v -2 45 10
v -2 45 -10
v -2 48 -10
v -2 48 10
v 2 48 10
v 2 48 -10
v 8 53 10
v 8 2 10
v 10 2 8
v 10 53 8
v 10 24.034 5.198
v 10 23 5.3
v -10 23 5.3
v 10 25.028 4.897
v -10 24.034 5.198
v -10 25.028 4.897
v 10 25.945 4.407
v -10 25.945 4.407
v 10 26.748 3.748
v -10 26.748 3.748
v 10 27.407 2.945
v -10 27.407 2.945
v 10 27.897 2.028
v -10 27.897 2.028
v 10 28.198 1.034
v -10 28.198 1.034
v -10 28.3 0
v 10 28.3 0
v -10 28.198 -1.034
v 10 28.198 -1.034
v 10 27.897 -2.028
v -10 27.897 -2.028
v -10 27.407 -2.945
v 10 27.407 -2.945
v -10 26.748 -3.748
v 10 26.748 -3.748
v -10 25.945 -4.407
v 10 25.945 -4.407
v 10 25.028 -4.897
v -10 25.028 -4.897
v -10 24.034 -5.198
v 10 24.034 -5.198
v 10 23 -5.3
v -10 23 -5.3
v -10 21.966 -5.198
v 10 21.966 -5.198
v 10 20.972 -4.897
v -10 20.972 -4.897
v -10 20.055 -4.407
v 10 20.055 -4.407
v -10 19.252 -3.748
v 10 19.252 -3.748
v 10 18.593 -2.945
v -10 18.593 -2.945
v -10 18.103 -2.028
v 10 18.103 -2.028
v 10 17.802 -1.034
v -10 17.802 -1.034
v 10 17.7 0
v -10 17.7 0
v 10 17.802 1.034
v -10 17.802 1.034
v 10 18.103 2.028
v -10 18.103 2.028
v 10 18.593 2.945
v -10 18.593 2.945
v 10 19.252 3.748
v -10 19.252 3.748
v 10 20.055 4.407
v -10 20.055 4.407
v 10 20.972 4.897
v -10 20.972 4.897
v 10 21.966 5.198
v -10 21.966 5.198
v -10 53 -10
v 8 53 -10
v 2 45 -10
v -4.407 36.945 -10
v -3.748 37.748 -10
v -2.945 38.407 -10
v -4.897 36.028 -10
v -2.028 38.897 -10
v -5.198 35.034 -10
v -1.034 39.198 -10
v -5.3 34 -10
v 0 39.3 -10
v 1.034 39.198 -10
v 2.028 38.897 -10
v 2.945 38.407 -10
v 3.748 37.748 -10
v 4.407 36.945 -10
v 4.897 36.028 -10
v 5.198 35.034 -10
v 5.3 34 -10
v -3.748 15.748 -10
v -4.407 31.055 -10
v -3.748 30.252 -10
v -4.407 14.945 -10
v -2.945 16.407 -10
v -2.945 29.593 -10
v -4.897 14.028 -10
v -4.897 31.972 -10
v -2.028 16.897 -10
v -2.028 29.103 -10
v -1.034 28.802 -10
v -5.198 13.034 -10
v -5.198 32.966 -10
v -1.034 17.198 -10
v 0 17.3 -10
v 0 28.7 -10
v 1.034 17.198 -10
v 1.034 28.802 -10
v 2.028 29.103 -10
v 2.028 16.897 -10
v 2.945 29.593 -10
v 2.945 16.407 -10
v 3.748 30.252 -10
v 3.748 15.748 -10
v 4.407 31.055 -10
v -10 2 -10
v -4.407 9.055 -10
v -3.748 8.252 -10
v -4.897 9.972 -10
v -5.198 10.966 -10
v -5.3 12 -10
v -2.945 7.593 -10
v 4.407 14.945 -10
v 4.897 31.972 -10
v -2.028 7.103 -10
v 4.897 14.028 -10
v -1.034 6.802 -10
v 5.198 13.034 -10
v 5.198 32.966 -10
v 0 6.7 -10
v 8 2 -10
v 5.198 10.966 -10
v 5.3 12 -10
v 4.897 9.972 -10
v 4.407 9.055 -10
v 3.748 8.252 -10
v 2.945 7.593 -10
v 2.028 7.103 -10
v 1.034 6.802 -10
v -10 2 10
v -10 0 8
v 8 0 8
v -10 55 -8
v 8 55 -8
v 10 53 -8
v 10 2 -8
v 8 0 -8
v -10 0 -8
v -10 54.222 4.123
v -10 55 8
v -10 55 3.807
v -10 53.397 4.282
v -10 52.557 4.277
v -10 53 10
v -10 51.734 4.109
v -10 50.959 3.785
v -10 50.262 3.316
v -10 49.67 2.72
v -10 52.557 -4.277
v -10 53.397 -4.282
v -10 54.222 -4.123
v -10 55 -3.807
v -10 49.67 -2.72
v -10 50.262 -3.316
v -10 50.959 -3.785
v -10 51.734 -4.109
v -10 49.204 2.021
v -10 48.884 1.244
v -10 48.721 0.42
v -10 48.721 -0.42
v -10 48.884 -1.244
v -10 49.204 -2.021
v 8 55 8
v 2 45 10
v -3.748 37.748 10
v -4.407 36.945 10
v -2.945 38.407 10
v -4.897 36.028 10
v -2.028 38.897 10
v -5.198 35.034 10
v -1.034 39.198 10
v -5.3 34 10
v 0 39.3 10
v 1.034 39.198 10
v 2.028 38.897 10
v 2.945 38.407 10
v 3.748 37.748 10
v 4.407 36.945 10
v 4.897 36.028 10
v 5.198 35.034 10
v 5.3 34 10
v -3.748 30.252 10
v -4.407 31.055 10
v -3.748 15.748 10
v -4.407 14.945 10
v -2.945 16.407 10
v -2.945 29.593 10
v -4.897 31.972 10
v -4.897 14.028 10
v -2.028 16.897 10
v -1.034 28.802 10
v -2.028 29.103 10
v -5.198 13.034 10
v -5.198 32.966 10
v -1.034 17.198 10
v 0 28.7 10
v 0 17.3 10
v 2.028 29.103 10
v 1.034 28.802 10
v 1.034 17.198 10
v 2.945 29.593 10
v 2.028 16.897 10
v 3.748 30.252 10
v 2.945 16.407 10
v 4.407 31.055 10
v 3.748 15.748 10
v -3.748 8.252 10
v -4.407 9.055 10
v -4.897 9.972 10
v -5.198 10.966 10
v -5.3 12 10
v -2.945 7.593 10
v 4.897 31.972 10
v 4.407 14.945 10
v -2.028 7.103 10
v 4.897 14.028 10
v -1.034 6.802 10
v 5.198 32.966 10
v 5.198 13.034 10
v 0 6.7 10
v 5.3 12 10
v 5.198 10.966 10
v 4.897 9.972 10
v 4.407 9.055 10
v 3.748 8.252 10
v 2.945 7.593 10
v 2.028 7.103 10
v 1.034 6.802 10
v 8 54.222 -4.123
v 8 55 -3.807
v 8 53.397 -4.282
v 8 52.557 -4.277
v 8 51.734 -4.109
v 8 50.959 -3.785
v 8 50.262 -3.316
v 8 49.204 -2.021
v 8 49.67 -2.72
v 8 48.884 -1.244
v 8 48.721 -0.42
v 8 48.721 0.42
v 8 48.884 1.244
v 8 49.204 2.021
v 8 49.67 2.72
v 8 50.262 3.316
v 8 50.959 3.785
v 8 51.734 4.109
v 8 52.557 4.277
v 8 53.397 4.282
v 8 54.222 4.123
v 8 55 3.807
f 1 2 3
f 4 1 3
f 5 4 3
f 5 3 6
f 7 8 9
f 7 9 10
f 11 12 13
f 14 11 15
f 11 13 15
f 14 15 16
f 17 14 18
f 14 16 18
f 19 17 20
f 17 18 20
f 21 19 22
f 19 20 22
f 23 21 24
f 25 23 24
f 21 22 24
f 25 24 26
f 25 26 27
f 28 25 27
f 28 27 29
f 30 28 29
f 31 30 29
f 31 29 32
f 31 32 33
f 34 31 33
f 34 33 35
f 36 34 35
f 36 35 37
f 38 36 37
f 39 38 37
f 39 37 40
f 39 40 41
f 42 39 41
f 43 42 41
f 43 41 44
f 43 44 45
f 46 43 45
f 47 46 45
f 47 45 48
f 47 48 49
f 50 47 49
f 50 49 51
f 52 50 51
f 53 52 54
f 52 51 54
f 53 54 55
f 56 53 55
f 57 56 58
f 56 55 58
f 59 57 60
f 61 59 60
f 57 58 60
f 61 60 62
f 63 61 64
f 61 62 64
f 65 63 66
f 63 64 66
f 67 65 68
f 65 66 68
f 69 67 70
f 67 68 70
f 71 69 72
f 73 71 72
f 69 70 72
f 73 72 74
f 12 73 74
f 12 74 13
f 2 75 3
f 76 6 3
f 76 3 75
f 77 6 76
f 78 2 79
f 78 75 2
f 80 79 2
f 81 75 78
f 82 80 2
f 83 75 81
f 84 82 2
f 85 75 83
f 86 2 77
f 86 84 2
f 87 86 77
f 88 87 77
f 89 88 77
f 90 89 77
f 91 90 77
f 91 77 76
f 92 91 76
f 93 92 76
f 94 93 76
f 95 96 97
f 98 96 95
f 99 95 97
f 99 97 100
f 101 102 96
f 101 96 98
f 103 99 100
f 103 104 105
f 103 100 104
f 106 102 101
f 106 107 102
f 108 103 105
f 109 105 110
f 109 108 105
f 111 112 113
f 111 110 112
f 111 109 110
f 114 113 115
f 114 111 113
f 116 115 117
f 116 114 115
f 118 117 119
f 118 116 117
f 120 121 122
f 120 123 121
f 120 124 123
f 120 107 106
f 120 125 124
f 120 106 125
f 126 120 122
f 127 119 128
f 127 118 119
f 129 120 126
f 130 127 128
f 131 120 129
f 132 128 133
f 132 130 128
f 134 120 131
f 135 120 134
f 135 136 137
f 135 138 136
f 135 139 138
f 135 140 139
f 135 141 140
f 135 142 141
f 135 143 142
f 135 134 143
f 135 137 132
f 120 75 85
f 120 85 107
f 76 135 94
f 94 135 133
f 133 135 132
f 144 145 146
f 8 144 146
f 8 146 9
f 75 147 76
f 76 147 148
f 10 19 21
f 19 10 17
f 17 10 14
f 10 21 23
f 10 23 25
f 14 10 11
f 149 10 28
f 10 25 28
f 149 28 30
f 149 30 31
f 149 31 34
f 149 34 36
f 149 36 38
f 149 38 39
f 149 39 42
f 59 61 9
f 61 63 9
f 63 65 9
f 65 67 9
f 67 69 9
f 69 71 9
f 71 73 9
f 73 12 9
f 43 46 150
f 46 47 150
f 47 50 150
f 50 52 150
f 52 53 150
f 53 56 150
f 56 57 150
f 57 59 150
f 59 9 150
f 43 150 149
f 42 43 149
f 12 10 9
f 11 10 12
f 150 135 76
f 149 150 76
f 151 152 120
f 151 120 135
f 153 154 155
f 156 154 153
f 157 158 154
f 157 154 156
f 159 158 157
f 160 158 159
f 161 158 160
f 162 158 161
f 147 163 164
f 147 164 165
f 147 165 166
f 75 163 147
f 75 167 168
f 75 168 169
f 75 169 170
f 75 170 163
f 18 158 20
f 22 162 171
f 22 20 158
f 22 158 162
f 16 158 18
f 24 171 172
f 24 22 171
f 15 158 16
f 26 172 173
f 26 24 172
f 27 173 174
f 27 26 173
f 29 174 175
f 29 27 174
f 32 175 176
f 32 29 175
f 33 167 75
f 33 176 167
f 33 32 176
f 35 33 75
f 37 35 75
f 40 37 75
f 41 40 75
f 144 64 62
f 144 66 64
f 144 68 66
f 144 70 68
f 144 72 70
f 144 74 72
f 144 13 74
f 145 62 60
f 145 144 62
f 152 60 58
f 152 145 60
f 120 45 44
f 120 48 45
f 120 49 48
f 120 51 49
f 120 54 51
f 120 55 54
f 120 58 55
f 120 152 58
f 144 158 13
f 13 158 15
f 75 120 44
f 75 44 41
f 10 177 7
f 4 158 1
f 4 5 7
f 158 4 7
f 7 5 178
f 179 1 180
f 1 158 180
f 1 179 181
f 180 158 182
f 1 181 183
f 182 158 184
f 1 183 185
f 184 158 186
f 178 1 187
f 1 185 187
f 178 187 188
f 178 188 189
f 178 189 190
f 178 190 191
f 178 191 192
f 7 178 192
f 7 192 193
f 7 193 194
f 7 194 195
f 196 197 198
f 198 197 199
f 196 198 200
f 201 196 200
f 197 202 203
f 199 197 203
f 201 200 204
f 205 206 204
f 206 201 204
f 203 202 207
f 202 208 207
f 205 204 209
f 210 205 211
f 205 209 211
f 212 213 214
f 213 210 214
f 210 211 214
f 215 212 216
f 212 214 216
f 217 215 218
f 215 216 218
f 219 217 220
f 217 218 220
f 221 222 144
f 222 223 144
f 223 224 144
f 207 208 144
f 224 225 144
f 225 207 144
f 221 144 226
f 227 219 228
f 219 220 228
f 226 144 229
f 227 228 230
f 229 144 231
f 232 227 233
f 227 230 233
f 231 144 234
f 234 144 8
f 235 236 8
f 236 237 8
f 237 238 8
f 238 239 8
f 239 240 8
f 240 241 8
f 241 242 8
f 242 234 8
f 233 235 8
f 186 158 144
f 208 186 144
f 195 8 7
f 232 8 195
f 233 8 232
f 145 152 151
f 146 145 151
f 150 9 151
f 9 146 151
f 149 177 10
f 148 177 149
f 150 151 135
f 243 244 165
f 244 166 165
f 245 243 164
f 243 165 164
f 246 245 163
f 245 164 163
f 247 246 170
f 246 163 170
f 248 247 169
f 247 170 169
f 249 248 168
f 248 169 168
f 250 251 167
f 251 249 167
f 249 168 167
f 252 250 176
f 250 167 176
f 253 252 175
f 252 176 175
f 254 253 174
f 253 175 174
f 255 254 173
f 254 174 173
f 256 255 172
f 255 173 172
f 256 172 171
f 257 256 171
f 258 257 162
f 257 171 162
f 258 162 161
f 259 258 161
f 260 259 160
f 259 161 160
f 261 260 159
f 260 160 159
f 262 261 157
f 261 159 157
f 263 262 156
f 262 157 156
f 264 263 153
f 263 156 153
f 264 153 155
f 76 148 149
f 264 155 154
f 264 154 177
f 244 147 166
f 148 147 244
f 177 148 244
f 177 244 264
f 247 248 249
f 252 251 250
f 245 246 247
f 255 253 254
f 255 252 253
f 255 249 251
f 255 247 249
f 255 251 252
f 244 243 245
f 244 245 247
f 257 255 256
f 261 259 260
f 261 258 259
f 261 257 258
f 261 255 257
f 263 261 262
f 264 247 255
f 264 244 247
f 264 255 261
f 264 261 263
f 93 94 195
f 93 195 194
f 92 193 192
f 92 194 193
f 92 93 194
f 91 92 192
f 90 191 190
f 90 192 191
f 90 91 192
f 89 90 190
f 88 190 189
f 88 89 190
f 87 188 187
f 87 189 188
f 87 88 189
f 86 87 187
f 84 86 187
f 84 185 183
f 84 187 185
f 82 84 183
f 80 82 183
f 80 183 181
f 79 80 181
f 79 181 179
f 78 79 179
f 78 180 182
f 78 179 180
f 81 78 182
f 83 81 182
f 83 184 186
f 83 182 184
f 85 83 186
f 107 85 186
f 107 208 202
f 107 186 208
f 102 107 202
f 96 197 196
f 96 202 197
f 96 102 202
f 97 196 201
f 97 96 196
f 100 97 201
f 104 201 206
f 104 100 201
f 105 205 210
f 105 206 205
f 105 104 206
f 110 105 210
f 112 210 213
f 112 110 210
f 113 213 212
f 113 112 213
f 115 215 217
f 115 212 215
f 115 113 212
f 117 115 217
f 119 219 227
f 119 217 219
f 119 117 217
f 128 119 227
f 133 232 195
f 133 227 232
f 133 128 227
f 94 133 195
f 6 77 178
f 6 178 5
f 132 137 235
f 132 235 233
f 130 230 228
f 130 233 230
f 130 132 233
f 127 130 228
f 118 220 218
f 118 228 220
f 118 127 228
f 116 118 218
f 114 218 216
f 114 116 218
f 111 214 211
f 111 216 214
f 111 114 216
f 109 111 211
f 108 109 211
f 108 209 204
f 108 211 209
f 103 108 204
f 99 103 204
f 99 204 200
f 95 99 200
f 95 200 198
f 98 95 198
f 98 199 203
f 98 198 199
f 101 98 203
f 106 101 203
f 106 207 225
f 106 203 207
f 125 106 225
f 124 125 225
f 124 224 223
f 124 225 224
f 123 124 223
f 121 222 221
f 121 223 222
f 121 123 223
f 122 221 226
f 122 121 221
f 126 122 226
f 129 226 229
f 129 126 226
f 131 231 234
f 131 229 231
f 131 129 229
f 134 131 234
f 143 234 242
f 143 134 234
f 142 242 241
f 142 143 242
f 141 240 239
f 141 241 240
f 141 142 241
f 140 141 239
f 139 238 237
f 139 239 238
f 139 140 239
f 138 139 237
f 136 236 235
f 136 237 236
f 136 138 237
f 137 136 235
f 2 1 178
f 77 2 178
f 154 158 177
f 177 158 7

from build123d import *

# Parameters (mm, degrees)
SKETCH1_W               = 20
SKETCH1_H               = 20
BOSS_EXTRUDE1_DEPTH     = 55
CUT_EXTRUDE1_DEPTH      = 60.371710435
CUT_EXTRUDE1_DEPTH_BACK = 60.371710435
SKETCH2_R               = 5.3
SKETCH2_W               = 4
SKETCH2_H               = 3
SKETCH3_R               = 5.3
CUT_EXTRUDE2_DEPTH      = 60.371710435
SKETCH4_R               = 4.3
CUT_EXTRUDE3_DEPTH      = 18
CHAMFER1_SIZE           = 2


with BuildPart() as part:
    # Sketch1 → Boss-Extrude1 (new body)
    with BuildSketch(Plane(origin=(0, 0, 0), x_dir=(1, 0, 0), z_dir=(0, 1, 0))):
        Rectangle(SKETCH1_W, SKETCH1_H)
    extrude(amount=BOSS_EXTRUDE1_DEPTH)

    # Sketch2 → Cut-Extrude1 (cut, two sides: drawn at the far end of the back side and taken through both)
    with BuildSketch(Plane.XY.offset(10).offset(-CUT_EXTRUDE1_DEPTH_BACK)):
        with Locations((0, 12)):
            Circle(SKETCH2_R)
        with Locations((0, 34)):
            Circle(SKETCH2_R)
        with Locations((0, 46.5)):
            Rectangle(SKETCH2_W, SKETCH2_H)
    extrude(amount=CUT_EXTRUDE1_DEPTH + CUT_EXTRUDE1_DEPTH_BACK, mode=Mode.SUBTRACT)

    # Sketch3 → Cut-Extrude2 (cut, through all)
    with BuildSketch(Plane.ZY.offset(10)):
        with Locations((0, 23)):
            Circle(SKETCH3_R)
    extrude(amount=-CUT_EXTRUDE2_DEPTH, mode=Mode.SUBTRACT)

    # Sketch4 → Cut-Extrude3 (cut)
    with BuildSketch(Plane.ZY.offset(10)):
        with Locations((0, 53)):
            Circle(SKETCH4_R)
    extrude(amount=-CUT_EXTRUDE3_DEPTH, mode=Mode.SUBTRACT)

    # Chamfer1
    chamfer1_edges = [part.edges().sort_by_distance(p)[0] for p in [
        (10, 55, 0),
        (0, 55, -10),
        (0, 0, -10),
        (10, 0, 0),
        (0, 0, 10),
        (0, 55, 10),
        (10, 27.5, -10),
        (10, 27.5, 10),
    ]]
    chamfer(chamfer1_edges, length=CHAMFER1_SIZE - 0.0001)  # a hair under: the kernel refuses the full size


solid = part.part
